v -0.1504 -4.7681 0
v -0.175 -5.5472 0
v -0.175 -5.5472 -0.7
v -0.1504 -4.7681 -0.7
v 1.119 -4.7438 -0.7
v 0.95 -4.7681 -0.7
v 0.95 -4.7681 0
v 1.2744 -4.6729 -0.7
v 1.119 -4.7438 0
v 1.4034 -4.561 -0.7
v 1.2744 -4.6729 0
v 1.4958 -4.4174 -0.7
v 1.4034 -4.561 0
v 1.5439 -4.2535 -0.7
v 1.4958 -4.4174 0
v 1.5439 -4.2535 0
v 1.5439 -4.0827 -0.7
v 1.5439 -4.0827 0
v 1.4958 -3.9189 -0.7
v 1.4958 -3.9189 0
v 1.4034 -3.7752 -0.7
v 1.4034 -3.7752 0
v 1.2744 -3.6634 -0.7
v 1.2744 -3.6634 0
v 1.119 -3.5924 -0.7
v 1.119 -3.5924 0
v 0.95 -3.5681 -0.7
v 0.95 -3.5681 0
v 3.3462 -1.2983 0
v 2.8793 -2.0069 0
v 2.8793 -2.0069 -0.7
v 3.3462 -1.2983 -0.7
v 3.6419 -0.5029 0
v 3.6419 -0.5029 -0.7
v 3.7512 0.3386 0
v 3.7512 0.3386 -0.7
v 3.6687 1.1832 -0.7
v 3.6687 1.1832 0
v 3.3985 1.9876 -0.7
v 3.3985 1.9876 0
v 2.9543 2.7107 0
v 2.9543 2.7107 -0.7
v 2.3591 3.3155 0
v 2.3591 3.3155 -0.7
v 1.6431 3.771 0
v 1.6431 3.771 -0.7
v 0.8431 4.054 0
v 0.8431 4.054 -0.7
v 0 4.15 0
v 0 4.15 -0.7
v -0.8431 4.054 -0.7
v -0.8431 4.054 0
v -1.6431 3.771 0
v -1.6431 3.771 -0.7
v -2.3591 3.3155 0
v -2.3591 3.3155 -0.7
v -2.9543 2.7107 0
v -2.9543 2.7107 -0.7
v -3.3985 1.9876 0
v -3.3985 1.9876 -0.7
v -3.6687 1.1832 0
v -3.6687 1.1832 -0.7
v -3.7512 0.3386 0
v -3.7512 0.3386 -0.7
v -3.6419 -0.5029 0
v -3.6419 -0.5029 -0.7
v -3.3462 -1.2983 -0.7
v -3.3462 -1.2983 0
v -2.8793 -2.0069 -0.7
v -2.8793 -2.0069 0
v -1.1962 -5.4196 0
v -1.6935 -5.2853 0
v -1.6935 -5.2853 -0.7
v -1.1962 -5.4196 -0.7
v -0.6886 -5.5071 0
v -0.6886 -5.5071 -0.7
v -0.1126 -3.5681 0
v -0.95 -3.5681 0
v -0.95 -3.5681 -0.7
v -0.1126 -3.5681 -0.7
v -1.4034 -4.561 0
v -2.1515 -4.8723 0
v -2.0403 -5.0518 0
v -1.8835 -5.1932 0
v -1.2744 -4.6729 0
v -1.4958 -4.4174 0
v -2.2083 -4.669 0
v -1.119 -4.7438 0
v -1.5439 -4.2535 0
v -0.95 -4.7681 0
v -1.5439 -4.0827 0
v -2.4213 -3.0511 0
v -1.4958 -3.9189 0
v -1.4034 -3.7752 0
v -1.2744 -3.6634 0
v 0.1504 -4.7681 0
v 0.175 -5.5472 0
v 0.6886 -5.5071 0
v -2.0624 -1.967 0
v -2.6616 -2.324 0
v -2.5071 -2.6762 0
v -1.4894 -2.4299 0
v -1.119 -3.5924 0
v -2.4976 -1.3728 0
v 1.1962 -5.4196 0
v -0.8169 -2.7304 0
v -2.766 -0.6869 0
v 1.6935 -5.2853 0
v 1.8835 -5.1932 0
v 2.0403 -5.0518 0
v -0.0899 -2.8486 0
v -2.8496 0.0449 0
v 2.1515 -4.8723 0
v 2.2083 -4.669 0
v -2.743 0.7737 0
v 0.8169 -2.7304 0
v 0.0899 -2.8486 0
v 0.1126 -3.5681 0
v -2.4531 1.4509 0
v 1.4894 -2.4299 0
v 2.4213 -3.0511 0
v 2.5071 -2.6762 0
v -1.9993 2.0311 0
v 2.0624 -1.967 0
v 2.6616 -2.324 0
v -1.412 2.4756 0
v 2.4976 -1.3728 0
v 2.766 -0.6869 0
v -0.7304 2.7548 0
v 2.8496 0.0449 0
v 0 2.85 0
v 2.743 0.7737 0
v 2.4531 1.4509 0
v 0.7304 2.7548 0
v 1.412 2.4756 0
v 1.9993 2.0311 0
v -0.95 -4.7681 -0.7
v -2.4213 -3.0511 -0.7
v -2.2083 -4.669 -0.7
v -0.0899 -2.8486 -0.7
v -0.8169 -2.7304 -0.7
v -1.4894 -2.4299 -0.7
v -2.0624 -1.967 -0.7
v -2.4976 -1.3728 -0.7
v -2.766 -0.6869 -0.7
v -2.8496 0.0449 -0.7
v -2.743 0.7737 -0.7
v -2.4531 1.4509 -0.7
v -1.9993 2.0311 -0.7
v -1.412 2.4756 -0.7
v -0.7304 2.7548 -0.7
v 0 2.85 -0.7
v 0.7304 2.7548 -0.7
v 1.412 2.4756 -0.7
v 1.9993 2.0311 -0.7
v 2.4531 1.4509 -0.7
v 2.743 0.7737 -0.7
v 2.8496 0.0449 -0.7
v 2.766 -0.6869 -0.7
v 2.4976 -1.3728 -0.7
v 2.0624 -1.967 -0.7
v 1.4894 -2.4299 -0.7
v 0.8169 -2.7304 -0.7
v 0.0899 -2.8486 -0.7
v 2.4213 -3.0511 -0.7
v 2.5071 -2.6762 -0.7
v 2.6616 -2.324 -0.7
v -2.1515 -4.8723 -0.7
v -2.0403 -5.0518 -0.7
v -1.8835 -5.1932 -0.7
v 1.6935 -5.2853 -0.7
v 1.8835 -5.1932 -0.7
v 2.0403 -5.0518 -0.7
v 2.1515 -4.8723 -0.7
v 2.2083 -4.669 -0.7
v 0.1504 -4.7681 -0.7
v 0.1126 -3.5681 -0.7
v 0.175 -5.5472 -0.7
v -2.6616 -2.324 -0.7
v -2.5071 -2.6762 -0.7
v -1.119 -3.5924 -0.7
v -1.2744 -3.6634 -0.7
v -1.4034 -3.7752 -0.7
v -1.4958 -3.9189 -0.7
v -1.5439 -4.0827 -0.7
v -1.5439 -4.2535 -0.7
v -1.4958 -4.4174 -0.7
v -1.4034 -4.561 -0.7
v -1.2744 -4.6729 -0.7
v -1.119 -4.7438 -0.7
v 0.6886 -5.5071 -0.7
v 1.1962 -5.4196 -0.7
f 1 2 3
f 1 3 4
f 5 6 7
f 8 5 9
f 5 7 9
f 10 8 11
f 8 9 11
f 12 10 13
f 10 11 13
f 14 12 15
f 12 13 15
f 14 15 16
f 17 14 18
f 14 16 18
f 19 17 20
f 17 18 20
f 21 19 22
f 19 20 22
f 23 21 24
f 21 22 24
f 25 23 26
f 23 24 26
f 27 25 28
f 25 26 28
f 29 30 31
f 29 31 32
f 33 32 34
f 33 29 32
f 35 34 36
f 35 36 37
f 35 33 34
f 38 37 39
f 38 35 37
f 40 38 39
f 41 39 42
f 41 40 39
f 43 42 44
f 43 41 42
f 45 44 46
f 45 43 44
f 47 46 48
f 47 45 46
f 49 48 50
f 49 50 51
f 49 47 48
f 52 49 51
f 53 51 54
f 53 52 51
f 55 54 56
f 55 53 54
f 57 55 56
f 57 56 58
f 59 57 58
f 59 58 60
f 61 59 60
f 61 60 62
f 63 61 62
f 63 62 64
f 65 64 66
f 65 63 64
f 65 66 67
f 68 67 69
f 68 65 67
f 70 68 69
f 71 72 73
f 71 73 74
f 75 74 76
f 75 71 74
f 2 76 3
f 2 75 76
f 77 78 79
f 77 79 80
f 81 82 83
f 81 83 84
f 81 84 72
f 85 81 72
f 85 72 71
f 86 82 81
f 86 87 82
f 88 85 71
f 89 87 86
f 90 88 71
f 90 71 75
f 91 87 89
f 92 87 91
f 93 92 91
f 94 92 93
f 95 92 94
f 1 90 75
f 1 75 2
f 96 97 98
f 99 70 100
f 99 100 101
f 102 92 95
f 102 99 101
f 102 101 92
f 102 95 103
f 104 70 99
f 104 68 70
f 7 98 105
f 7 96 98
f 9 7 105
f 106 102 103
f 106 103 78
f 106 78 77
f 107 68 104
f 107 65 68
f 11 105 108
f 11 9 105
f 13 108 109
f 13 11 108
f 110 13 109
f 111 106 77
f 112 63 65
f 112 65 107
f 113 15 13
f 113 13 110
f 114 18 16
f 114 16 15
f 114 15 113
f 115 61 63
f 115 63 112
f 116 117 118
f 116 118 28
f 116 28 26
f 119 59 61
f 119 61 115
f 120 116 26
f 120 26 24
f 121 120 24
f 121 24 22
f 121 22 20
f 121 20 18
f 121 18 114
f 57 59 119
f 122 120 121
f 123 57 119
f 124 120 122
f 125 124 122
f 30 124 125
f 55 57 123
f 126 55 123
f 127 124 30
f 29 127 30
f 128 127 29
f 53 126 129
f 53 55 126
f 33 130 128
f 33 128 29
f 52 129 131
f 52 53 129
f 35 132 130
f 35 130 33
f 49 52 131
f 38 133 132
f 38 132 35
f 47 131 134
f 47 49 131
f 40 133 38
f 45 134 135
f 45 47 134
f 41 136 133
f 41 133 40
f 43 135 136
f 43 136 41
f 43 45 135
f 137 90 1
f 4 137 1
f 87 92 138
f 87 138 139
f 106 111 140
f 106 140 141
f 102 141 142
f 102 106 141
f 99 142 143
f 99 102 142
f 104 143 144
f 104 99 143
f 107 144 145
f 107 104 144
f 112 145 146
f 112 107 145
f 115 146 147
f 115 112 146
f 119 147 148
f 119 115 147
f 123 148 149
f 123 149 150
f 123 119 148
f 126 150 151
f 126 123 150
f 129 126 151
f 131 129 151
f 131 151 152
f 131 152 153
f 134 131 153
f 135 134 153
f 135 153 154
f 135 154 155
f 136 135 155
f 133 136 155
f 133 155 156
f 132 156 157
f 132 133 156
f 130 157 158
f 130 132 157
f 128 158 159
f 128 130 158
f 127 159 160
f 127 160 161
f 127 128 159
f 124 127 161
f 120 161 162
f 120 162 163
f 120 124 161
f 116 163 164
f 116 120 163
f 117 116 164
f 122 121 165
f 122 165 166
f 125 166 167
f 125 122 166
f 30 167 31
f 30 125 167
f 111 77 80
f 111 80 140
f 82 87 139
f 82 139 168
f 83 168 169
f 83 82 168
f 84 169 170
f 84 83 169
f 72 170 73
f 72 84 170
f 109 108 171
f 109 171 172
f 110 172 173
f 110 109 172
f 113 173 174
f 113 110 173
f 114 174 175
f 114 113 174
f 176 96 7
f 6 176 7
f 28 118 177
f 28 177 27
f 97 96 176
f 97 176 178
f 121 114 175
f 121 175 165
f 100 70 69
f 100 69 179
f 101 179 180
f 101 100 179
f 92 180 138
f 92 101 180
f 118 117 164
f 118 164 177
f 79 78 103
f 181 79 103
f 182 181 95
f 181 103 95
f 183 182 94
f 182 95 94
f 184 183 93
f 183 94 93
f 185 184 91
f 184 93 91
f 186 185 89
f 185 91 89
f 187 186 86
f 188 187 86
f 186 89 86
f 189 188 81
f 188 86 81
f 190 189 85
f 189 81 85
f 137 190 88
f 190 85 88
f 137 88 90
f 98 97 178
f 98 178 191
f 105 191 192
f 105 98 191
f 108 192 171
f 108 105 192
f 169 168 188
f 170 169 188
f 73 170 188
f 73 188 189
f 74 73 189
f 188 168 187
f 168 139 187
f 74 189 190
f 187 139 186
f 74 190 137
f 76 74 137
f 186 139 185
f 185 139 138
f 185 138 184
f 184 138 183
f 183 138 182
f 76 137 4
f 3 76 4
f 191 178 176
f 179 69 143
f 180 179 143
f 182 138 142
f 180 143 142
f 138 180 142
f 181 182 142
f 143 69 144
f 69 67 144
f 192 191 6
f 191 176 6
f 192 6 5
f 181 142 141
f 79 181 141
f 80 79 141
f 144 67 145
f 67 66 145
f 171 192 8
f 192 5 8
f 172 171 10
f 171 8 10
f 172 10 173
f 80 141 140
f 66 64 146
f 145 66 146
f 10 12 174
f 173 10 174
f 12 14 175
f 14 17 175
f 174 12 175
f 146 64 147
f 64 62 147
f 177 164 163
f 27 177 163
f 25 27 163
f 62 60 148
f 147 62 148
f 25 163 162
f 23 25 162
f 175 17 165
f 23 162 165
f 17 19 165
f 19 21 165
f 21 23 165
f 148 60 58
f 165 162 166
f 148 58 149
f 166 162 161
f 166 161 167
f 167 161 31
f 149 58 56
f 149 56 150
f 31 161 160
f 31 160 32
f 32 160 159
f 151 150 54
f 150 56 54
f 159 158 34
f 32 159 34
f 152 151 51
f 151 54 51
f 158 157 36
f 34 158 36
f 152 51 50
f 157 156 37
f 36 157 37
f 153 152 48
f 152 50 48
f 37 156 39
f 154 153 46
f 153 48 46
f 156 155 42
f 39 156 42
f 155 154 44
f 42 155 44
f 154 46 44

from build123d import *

# Parameters (mm, degrees)
BODYSKE_R   = 0.6
BODY_DEPTH  = 0.7
NOTSKE_W    = 1.9
NOTSKE_H    = 1.2
NOTCH_DEPTH = 7.733295861


with BuildPart() as part:
    # BodySke → Body (new body)
    with BuildSketch(Plane.XY):
        with BuildLine():
            Line((0.089864865, -2.848582859), (0.175, -5.547240305))
            ThreePointArc((0.175, -5.547240305), (0.943397685, -5.469232195), (1.693525559, -5.285307104))
            ThreePointArc((1.693525559, -5.285307104), (2.040324005, -5.051829297), (2.2082544, -4.668971058))
            Line((2.2082544, -4.668971058), (2.421252601, -3.051089095))
            ThreePointArc((2.421252601, -3.051089095), (2.576047275, -2.4964236), (2.879326572, -2.006896409))
            ThreePointArc((2.879326572, -2.006896409), (0, 4.15), (-2.879326572, -2.006896409))
            ThreePointArc((-2.879326572, -2.006896409), (-2.576047275, -2.4964236), (-2.421252601, -3.051089095))
            Line((-2.421252601, -3.051089095), (-2.2082544, -4.668971058))
            ThreePointArc((-2.2082544, -4.668971058), (-2.040324005, -5.051829297), (-1.693525559, -5.285307104))
            ThreePointArc((-1.693525559, -5.285307104), (-0.943397685, -5.469232195), (-0.175, -5.547240305))
            Line((-0.175, -5.547240305), (-0.089864865, -2.848582859))
            ThreePointArc((-0.089864865, -2.848582859), (0, 2.85), (0.089864865, -2.848582859))
        make_face()
        with Locations((0.95, -4.168108084)):
            Circle(BODYSKE_R, mode=Mode.SUBTRACT)
        with Locations((-0.95, -4.168108084)):
            Circle(BODYSKE_R, mode=Mode.SUBTRACT)
    extrude(amount=-BODY_DEPTH)

    # NotSke → Notch (cut, through all)
    with BuildSketch(Plane.XY):
        with Locations((0, -4.168108084)):
            Rectangle(NOTSKE_W, NOTSKE_H)
    extrude(amount=-NOTCH_DEPTH, mode=Mode.SUBTRACT)


solid = part.part
